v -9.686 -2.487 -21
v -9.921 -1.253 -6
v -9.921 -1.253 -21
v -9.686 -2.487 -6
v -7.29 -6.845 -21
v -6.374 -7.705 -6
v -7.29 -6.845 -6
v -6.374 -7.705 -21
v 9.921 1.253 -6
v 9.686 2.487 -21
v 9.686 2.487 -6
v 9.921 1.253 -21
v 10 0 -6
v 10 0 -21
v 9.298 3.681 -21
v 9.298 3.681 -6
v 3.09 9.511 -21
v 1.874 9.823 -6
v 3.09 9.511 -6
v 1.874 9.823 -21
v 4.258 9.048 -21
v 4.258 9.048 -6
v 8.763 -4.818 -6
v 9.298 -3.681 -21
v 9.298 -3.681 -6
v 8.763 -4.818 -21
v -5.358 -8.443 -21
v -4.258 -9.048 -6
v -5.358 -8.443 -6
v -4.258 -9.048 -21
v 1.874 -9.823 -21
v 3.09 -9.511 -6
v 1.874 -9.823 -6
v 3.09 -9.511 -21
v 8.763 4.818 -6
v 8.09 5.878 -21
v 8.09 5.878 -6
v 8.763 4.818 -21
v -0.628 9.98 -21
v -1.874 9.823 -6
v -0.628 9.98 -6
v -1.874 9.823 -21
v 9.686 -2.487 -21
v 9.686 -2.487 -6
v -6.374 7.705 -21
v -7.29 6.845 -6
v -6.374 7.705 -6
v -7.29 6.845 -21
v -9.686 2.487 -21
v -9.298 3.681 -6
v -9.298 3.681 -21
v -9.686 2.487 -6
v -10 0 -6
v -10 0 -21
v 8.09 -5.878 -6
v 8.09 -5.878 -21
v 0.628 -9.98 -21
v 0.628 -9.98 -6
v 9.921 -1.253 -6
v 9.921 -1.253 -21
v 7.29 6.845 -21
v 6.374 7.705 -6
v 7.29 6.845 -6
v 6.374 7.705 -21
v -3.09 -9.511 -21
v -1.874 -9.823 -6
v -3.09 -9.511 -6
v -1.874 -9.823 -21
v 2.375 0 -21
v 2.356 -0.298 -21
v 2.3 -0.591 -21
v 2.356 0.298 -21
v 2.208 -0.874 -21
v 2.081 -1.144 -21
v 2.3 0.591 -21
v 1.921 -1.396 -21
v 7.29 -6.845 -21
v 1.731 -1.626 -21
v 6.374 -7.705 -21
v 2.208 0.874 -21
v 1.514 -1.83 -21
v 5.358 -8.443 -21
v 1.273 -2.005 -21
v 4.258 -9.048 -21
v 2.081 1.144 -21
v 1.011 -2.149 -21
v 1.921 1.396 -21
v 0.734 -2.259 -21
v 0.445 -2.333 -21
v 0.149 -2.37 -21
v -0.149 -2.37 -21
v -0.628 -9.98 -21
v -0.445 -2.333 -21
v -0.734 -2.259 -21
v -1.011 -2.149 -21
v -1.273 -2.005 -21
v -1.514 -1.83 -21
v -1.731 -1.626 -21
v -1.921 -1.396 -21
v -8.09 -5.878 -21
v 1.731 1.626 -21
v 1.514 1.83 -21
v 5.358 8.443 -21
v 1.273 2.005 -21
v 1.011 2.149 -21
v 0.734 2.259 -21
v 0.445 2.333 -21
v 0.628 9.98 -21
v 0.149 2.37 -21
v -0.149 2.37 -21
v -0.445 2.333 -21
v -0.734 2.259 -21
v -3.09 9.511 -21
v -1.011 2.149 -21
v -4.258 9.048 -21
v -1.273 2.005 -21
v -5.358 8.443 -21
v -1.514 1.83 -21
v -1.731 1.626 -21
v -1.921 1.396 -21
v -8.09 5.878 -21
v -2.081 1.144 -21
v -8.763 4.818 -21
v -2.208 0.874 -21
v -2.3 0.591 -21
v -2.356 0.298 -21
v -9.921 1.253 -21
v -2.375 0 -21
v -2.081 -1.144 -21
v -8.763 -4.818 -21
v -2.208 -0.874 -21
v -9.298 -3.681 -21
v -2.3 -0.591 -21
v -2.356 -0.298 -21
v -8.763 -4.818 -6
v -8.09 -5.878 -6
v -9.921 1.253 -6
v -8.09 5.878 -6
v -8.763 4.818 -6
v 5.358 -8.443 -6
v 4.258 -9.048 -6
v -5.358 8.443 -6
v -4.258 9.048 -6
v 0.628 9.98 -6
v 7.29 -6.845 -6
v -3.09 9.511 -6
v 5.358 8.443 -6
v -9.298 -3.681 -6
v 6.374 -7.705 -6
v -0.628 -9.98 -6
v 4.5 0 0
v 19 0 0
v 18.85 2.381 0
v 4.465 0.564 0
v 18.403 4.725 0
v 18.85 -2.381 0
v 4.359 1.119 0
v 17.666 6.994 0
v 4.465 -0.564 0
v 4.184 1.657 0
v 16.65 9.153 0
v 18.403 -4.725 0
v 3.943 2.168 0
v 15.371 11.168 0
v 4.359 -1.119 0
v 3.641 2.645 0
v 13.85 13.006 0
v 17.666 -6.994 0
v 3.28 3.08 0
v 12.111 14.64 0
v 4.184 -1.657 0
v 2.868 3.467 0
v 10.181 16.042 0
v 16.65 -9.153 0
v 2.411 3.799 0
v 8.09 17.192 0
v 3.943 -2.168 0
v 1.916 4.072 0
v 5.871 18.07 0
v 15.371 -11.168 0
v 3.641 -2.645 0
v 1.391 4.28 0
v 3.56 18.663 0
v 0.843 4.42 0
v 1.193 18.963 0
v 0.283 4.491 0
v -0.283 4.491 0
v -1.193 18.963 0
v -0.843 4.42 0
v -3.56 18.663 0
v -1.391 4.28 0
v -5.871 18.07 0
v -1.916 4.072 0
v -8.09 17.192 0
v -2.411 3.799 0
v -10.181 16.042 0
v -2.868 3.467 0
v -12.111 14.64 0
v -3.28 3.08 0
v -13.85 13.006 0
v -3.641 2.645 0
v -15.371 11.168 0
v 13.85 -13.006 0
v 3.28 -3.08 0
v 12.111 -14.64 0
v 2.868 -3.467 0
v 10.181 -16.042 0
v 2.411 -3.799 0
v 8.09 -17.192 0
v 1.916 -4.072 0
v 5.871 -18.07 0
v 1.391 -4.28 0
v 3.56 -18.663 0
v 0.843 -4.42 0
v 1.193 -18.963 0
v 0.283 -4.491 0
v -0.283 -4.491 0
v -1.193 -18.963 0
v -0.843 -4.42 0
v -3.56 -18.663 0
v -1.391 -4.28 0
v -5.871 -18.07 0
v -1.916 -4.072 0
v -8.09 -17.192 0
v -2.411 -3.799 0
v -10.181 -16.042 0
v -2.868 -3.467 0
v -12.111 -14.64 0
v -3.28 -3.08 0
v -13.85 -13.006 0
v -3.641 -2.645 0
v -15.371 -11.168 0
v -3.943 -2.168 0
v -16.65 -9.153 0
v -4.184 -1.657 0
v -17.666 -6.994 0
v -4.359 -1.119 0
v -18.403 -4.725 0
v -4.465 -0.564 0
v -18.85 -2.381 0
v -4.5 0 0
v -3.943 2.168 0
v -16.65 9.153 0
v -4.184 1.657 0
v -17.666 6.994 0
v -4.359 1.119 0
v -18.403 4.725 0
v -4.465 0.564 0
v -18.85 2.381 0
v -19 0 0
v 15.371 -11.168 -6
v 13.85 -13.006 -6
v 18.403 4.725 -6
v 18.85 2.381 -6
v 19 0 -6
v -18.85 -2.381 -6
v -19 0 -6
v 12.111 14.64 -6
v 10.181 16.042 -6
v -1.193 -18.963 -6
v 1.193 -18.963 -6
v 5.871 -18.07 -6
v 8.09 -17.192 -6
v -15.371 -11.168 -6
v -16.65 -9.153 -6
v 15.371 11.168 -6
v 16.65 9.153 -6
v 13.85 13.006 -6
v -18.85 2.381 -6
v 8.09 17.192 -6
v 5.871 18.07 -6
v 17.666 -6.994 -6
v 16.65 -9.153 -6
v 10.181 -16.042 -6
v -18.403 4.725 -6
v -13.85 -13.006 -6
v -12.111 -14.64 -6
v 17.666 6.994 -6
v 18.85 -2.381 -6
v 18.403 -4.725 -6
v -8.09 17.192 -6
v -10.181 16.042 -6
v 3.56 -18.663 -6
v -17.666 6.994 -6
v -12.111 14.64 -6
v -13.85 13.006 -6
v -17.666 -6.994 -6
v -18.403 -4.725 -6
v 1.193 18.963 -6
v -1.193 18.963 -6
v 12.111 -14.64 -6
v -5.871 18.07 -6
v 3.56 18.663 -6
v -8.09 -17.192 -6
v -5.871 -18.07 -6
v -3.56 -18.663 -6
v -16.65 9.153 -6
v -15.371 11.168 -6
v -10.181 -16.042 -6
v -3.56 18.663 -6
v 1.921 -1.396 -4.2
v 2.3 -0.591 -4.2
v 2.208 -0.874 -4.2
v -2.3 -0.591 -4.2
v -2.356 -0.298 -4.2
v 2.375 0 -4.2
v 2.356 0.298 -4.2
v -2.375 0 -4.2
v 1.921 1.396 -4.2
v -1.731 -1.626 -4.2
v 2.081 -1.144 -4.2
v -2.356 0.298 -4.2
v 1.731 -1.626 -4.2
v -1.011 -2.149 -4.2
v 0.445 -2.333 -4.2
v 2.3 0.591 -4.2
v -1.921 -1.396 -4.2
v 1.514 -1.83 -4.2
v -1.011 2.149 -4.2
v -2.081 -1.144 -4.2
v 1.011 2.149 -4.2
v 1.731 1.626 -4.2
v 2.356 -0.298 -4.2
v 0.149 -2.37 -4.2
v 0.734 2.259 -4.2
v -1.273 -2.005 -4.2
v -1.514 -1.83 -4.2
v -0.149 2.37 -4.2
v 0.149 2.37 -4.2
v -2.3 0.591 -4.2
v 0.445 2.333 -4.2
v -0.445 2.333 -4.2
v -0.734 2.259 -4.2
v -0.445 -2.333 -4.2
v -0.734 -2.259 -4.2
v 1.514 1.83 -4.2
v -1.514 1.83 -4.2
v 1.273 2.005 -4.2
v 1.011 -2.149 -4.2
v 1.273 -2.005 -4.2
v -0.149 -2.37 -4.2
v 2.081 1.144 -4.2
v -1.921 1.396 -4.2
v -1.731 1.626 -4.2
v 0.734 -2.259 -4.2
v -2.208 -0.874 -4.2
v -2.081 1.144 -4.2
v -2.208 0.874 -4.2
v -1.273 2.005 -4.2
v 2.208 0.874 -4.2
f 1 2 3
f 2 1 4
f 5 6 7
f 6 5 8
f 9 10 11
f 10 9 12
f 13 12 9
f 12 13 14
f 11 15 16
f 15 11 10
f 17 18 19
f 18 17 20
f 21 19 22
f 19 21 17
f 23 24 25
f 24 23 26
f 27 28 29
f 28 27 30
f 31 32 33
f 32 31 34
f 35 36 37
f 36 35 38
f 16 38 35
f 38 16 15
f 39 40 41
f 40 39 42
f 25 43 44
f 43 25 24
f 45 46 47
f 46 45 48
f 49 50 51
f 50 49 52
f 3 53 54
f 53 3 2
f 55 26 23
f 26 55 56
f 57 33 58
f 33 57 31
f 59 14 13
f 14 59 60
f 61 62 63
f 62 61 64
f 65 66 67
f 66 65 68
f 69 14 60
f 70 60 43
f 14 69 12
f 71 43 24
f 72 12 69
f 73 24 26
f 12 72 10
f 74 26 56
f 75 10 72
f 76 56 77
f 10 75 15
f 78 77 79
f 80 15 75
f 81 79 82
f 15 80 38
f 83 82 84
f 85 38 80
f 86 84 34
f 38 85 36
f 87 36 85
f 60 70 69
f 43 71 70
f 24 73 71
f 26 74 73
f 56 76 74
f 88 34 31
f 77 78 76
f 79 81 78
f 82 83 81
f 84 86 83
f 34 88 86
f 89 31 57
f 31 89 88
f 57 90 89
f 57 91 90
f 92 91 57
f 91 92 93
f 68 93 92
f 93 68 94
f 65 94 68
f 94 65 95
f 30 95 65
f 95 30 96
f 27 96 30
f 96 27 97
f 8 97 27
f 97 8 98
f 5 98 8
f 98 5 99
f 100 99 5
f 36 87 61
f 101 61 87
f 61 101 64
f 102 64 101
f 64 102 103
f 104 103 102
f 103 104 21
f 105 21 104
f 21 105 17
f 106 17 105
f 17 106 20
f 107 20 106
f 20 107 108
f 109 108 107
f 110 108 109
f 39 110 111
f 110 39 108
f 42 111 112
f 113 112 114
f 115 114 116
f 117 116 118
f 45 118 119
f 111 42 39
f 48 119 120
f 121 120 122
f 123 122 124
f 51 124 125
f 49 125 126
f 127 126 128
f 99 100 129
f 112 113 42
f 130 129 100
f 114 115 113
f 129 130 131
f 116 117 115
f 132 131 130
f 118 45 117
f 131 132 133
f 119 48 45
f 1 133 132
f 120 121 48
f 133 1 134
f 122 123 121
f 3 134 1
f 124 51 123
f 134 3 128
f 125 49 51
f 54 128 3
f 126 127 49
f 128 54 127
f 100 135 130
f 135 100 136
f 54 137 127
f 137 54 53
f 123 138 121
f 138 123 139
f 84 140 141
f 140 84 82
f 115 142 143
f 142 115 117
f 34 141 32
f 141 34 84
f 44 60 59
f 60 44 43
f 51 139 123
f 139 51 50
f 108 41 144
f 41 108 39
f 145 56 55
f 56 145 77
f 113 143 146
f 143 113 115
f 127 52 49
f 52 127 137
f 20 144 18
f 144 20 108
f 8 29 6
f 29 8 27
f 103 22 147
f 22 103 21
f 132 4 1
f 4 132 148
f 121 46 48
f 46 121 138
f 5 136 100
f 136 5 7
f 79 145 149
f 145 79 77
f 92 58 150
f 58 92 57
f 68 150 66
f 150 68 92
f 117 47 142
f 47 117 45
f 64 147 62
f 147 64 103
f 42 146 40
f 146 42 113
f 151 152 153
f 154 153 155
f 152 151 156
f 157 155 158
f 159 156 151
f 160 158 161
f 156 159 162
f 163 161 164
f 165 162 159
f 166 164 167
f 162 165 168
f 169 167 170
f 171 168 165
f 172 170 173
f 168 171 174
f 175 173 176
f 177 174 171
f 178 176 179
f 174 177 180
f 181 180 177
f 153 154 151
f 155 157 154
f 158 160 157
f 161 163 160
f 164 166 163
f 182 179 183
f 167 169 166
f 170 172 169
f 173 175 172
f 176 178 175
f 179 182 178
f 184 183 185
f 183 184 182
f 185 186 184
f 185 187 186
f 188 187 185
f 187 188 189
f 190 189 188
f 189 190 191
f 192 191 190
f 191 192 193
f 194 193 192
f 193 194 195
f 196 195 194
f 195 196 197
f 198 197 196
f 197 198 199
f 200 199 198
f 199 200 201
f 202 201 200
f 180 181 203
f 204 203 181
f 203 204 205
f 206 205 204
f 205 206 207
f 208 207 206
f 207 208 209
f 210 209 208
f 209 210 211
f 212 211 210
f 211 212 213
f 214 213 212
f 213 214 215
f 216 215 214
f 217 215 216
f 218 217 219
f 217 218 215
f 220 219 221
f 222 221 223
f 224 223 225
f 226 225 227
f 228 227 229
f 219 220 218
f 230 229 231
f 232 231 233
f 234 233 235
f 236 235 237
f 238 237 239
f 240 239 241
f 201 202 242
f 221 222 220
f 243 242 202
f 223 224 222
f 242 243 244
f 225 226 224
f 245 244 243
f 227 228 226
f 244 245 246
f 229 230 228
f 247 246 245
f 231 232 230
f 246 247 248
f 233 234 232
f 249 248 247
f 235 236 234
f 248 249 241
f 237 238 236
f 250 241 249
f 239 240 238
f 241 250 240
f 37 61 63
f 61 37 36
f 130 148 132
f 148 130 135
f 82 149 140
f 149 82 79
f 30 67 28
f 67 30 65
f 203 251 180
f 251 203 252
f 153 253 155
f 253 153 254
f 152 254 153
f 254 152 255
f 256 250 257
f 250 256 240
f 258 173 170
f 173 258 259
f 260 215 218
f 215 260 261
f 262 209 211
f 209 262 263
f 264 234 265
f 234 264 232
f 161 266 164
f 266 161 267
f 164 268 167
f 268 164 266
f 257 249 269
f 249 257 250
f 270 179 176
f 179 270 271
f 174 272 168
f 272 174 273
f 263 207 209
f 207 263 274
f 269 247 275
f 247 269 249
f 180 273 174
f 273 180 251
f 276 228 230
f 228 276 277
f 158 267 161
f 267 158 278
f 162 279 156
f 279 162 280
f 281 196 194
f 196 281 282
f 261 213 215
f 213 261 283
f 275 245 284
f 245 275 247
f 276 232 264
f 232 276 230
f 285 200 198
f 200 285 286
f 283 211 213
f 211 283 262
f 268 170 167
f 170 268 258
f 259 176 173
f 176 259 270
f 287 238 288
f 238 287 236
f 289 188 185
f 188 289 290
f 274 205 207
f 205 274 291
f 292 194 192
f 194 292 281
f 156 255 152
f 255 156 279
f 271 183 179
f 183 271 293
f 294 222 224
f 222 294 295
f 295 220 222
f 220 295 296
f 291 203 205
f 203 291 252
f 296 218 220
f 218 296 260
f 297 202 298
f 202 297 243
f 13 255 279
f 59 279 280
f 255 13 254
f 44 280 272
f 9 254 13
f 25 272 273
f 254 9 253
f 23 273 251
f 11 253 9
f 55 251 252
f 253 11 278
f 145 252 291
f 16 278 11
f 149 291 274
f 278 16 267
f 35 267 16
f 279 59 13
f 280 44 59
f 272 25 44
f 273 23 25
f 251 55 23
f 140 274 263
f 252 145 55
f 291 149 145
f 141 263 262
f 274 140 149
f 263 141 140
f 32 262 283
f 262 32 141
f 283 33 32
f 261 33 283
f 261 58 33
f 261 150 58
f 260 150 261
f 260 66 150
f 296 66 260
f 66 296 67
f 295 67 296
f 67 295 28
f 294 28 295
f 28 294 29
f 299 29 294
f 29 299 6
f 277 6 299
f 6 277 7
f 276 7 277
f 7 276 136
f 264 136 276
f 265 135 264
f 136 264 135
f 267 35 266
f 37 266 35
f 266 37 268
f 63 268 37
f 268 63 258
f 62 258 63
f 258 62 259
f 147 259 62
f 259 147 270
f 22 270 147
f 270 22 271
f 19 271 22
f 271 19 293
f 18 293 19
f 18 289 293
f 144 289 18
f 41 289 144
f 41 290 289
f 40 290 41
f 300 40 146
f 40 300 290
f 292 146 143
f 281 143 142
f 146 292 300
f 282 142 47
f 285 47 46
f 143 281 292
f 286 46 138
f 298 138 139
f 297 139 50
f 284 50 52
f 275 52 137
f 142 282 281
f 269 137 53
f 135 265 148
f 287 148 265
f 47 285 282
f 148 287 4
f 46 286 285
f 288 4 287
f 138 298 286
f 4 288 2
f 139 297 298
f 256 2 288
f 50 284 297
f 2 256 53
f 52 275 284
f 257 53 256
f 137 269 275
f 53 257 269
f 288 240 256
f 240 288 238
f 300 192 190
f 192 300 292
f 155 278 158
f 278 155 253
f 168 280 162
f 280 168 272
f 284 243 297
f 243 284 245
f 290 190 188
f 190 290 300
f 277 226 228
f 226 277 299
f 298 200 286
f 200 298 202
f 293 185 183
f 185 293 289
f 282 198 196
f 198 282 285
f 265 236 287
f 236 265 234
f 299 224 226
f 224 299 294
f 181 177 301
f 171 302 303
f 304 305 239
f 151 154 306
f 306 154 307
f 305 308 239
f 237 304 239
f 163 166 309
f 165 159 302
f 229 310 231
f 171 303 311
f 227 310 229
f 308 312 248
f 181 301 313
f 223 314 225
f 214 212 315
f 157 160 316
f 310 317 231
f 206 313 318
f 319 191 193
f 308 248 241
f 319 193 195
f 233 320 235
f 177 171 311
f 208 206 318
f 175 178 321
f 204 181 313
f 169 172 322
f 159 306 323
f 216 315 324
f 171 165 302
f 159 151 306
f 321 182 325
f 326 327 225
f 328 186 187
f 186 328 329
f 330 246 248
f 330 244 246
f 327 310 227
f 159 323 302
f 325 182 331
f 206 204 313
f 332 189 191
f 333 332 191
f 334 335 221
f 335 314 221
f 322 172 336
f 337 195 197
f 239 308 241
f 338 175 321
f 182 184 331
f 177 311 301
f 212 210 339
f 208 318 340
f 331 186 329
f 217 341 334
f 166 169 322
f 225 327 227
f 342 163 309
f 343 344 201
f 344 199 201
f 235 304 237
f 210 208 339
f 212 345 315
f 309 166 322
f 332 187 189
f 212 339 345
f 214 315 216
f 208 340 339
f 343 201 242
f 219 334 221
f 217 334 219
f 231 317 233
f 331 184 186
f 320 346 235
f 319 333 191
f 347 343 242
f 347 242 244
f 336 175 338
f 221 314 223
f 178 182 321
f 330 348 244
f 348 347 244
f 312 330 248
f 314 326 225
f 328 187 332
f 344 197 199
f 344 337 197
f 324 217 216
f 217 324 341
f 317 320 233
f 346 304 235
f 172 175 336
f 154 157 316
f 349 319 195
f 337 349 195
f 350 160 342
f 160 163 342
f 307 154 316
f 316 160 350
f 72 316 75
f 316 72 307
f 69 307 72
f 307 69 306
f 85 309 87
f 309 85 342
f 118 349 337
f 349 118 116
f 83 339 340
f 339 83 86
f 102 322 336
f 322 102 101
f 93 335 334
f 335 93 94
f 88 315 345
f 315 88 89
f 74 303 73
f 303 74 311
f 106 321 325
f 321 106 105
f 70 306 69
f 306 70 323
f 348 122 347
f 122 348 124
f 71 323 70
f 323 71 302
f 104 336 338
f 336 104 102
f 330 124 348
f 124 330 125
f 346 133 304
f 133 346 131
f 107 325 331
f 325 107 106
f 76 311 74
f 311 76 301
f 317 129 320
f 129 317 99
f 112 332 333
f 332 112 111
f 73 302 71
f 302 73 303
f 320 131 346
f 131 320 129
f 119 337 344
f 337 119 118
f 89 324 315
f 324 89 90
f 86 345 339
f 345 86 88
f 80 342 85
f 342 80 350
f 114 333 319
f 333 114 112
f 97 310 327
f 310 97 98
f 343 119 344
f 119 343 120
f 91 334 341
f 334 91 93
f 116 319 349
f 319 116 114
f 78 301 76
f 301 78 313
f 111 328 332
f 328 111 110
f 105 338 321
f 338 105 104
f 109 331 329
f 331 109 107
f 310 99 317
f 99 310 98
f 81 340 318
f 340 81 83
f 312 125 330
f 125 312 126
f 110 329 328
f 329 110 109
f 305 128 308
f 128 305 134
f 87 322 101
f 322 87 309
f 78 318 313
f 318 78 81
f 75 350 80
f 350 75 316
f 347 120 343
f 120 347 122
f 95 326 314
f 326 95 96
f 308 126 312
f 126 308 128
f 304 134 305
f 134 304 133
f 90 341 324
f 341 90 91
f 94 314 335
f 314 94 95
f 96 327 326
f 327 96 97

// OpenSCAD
$fn = 50;


difference() {
	union() {
		translate(v = [0, 0, -21.0000000000]) {
			cylinder(h = 21, r = 10.0000000000);
		}
		translate(v = [0, 0, -6.0000000000]) {
			cylinder(h = 6, r = 19.0000000000);
		}
	}
	union() {
		translate(v = [0, 0, 0]) {
			rotate(a = [0, 0, 0]) {
				difference() {
					union() {
						#translate(v = [0, 0, -21.0000000000]) {
							cylinder(h = 21, r = 2.2500000000);
						}
						#translate(v = [0, 0, -4.2000000000]) {
							cylinder(h = 4.2000000000, r1 = 2.3750000000, r2 = 4.5000000000);
						}
						#translate(v = [0, 0, -21.0000000000]) {
							cylinder(h = 21, r = 2.3750000000);
						}
						#translate(v = [0, 0, -21.0000000000]) {
							cylinder(h = 21, r = 2.2500000000);
						}
					}
					union();
				}
			}
		}
	}
}
